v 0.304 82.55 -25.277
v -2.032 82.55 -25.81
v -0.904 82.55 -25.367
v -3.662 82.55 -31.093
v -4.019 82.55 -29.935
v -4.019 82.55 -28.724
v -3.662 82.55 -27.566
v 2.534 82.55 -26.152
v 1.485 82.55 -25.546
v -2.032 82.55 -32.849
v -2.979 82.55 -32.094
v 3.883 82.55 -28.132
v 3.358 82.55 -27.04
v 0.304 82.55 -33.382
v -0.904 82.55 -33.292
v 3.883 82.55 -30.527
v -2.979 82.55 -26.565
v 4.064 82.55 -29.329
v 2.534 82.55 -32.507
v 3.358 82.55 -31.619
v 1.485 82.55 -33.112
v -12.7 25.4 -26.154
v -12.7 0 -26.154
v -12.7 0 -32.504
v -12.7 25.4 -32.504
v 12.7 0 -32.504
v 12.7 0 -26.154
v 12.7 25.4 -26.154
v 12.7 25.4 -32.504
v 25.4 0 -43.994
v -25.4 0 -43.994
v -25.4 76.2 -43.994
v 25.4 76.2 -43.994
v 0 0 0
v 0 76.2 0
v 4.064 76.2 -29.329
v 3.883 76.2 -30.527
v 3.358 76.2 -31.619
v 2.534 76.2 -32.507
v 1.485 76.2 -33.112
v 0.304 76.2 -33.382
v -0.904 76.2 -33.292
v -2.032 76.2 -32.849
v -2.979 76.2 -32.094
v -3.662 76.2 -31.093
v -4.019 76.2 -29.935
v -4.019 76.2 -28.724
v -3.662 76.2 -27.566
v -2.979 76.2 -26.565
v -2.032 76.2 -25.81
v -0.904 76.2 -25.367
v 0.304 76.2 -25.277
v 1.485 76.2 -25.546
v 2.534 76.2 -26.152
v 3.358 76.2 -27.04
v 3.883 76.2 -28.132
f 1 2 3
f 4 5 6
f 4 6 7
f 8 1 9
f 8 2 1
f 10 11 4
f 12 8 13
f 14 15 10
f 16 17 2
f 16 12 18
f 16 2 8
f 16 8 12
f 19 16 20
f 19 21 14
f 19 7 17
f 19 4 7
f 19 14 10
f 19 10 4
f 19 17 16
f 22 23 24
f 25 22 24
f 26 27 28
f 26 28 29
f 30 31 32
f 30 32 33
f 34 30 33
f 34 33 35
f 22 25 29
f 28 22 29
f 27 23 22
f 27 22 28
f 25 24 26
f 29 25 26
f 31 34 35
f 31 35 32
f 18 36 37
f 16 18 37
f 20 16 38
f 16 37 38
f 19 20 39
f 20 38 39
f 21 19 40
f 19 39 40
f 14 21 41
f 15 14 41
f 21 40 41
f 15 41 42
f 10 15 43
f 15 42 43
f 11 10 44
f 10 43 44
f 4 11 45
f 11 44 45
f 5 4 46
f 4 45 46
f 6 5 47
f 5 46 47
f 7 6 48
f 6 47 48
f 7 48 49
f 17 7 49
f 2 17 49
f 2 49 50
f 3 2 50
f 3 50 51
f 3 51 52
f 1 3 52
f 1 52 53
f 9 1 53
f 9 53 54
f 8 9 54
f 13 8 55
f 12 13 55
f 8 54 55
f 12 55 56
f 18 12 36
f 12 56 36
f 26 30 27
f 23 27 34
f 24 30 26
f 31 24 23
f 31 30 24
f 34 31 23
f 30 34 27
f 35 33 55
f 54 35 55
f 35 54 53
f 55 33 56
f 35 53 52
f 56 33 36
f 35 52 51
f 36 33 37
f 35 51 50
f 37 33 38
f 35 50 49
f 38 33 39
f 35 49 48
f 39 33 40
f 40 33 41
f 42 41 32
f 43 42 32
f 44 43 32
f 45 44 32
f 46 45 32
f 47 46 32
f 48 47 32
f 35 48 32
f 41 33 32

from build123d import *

# Parameters (mm, degrees)
BOSS_EXTRUDE1_DEPTH = 76.2
SKETCH3_R           = 4.064
BOSS_EXTRUDE2_DEPTH = 6.35
SKETCH2_W           = 25.4
SKETCH2_H           = 6.35
CUT_EXTRUDE2_DEPTH  = 25.4


with BuildPart() as part:
    # Sketch1 → Boss-Extrude1 (new body)
    with BuildSketch(Plane(origin=(0, 0, 0), x_dir=(1, 0, 0), z_dir=(0, 1, 0))):
        Polygon((0, 0), (-25.4, 43.994090512), (25.4, 43.994090512), align=None)
    extrude(amount=BOSS_EXTRUDE1_DEPTH)

    # Sketch3 → Boss-Extrude2 (add)
    with BuildSketch(Plane(origin=(0, 76.2, 0), x_dir=(1, 0, 0), z_dir=(0, 1, 0))):
        with Locations((0, 29.329393675)):
            Circle(SKETCH3_R)
    extrude(amount=BOSS_EXTRUDE2_DEPTH)

    # Sketch2 → Cut-Extrude2 (cut)
    with BuildSketch(Plane(origin=(0, 0, 0), x_dir=(1, 0, 0), z_dir=(0, 1, 0))):
        with Locations((0, 29.329393675)):
            Rectangle(SKETCH2_W, SKETCH2_H)
    extrude(amount=CUT_EXTRUDE2_DEPTH, mode=Mode.SUBTRACT)


solid = part.part
